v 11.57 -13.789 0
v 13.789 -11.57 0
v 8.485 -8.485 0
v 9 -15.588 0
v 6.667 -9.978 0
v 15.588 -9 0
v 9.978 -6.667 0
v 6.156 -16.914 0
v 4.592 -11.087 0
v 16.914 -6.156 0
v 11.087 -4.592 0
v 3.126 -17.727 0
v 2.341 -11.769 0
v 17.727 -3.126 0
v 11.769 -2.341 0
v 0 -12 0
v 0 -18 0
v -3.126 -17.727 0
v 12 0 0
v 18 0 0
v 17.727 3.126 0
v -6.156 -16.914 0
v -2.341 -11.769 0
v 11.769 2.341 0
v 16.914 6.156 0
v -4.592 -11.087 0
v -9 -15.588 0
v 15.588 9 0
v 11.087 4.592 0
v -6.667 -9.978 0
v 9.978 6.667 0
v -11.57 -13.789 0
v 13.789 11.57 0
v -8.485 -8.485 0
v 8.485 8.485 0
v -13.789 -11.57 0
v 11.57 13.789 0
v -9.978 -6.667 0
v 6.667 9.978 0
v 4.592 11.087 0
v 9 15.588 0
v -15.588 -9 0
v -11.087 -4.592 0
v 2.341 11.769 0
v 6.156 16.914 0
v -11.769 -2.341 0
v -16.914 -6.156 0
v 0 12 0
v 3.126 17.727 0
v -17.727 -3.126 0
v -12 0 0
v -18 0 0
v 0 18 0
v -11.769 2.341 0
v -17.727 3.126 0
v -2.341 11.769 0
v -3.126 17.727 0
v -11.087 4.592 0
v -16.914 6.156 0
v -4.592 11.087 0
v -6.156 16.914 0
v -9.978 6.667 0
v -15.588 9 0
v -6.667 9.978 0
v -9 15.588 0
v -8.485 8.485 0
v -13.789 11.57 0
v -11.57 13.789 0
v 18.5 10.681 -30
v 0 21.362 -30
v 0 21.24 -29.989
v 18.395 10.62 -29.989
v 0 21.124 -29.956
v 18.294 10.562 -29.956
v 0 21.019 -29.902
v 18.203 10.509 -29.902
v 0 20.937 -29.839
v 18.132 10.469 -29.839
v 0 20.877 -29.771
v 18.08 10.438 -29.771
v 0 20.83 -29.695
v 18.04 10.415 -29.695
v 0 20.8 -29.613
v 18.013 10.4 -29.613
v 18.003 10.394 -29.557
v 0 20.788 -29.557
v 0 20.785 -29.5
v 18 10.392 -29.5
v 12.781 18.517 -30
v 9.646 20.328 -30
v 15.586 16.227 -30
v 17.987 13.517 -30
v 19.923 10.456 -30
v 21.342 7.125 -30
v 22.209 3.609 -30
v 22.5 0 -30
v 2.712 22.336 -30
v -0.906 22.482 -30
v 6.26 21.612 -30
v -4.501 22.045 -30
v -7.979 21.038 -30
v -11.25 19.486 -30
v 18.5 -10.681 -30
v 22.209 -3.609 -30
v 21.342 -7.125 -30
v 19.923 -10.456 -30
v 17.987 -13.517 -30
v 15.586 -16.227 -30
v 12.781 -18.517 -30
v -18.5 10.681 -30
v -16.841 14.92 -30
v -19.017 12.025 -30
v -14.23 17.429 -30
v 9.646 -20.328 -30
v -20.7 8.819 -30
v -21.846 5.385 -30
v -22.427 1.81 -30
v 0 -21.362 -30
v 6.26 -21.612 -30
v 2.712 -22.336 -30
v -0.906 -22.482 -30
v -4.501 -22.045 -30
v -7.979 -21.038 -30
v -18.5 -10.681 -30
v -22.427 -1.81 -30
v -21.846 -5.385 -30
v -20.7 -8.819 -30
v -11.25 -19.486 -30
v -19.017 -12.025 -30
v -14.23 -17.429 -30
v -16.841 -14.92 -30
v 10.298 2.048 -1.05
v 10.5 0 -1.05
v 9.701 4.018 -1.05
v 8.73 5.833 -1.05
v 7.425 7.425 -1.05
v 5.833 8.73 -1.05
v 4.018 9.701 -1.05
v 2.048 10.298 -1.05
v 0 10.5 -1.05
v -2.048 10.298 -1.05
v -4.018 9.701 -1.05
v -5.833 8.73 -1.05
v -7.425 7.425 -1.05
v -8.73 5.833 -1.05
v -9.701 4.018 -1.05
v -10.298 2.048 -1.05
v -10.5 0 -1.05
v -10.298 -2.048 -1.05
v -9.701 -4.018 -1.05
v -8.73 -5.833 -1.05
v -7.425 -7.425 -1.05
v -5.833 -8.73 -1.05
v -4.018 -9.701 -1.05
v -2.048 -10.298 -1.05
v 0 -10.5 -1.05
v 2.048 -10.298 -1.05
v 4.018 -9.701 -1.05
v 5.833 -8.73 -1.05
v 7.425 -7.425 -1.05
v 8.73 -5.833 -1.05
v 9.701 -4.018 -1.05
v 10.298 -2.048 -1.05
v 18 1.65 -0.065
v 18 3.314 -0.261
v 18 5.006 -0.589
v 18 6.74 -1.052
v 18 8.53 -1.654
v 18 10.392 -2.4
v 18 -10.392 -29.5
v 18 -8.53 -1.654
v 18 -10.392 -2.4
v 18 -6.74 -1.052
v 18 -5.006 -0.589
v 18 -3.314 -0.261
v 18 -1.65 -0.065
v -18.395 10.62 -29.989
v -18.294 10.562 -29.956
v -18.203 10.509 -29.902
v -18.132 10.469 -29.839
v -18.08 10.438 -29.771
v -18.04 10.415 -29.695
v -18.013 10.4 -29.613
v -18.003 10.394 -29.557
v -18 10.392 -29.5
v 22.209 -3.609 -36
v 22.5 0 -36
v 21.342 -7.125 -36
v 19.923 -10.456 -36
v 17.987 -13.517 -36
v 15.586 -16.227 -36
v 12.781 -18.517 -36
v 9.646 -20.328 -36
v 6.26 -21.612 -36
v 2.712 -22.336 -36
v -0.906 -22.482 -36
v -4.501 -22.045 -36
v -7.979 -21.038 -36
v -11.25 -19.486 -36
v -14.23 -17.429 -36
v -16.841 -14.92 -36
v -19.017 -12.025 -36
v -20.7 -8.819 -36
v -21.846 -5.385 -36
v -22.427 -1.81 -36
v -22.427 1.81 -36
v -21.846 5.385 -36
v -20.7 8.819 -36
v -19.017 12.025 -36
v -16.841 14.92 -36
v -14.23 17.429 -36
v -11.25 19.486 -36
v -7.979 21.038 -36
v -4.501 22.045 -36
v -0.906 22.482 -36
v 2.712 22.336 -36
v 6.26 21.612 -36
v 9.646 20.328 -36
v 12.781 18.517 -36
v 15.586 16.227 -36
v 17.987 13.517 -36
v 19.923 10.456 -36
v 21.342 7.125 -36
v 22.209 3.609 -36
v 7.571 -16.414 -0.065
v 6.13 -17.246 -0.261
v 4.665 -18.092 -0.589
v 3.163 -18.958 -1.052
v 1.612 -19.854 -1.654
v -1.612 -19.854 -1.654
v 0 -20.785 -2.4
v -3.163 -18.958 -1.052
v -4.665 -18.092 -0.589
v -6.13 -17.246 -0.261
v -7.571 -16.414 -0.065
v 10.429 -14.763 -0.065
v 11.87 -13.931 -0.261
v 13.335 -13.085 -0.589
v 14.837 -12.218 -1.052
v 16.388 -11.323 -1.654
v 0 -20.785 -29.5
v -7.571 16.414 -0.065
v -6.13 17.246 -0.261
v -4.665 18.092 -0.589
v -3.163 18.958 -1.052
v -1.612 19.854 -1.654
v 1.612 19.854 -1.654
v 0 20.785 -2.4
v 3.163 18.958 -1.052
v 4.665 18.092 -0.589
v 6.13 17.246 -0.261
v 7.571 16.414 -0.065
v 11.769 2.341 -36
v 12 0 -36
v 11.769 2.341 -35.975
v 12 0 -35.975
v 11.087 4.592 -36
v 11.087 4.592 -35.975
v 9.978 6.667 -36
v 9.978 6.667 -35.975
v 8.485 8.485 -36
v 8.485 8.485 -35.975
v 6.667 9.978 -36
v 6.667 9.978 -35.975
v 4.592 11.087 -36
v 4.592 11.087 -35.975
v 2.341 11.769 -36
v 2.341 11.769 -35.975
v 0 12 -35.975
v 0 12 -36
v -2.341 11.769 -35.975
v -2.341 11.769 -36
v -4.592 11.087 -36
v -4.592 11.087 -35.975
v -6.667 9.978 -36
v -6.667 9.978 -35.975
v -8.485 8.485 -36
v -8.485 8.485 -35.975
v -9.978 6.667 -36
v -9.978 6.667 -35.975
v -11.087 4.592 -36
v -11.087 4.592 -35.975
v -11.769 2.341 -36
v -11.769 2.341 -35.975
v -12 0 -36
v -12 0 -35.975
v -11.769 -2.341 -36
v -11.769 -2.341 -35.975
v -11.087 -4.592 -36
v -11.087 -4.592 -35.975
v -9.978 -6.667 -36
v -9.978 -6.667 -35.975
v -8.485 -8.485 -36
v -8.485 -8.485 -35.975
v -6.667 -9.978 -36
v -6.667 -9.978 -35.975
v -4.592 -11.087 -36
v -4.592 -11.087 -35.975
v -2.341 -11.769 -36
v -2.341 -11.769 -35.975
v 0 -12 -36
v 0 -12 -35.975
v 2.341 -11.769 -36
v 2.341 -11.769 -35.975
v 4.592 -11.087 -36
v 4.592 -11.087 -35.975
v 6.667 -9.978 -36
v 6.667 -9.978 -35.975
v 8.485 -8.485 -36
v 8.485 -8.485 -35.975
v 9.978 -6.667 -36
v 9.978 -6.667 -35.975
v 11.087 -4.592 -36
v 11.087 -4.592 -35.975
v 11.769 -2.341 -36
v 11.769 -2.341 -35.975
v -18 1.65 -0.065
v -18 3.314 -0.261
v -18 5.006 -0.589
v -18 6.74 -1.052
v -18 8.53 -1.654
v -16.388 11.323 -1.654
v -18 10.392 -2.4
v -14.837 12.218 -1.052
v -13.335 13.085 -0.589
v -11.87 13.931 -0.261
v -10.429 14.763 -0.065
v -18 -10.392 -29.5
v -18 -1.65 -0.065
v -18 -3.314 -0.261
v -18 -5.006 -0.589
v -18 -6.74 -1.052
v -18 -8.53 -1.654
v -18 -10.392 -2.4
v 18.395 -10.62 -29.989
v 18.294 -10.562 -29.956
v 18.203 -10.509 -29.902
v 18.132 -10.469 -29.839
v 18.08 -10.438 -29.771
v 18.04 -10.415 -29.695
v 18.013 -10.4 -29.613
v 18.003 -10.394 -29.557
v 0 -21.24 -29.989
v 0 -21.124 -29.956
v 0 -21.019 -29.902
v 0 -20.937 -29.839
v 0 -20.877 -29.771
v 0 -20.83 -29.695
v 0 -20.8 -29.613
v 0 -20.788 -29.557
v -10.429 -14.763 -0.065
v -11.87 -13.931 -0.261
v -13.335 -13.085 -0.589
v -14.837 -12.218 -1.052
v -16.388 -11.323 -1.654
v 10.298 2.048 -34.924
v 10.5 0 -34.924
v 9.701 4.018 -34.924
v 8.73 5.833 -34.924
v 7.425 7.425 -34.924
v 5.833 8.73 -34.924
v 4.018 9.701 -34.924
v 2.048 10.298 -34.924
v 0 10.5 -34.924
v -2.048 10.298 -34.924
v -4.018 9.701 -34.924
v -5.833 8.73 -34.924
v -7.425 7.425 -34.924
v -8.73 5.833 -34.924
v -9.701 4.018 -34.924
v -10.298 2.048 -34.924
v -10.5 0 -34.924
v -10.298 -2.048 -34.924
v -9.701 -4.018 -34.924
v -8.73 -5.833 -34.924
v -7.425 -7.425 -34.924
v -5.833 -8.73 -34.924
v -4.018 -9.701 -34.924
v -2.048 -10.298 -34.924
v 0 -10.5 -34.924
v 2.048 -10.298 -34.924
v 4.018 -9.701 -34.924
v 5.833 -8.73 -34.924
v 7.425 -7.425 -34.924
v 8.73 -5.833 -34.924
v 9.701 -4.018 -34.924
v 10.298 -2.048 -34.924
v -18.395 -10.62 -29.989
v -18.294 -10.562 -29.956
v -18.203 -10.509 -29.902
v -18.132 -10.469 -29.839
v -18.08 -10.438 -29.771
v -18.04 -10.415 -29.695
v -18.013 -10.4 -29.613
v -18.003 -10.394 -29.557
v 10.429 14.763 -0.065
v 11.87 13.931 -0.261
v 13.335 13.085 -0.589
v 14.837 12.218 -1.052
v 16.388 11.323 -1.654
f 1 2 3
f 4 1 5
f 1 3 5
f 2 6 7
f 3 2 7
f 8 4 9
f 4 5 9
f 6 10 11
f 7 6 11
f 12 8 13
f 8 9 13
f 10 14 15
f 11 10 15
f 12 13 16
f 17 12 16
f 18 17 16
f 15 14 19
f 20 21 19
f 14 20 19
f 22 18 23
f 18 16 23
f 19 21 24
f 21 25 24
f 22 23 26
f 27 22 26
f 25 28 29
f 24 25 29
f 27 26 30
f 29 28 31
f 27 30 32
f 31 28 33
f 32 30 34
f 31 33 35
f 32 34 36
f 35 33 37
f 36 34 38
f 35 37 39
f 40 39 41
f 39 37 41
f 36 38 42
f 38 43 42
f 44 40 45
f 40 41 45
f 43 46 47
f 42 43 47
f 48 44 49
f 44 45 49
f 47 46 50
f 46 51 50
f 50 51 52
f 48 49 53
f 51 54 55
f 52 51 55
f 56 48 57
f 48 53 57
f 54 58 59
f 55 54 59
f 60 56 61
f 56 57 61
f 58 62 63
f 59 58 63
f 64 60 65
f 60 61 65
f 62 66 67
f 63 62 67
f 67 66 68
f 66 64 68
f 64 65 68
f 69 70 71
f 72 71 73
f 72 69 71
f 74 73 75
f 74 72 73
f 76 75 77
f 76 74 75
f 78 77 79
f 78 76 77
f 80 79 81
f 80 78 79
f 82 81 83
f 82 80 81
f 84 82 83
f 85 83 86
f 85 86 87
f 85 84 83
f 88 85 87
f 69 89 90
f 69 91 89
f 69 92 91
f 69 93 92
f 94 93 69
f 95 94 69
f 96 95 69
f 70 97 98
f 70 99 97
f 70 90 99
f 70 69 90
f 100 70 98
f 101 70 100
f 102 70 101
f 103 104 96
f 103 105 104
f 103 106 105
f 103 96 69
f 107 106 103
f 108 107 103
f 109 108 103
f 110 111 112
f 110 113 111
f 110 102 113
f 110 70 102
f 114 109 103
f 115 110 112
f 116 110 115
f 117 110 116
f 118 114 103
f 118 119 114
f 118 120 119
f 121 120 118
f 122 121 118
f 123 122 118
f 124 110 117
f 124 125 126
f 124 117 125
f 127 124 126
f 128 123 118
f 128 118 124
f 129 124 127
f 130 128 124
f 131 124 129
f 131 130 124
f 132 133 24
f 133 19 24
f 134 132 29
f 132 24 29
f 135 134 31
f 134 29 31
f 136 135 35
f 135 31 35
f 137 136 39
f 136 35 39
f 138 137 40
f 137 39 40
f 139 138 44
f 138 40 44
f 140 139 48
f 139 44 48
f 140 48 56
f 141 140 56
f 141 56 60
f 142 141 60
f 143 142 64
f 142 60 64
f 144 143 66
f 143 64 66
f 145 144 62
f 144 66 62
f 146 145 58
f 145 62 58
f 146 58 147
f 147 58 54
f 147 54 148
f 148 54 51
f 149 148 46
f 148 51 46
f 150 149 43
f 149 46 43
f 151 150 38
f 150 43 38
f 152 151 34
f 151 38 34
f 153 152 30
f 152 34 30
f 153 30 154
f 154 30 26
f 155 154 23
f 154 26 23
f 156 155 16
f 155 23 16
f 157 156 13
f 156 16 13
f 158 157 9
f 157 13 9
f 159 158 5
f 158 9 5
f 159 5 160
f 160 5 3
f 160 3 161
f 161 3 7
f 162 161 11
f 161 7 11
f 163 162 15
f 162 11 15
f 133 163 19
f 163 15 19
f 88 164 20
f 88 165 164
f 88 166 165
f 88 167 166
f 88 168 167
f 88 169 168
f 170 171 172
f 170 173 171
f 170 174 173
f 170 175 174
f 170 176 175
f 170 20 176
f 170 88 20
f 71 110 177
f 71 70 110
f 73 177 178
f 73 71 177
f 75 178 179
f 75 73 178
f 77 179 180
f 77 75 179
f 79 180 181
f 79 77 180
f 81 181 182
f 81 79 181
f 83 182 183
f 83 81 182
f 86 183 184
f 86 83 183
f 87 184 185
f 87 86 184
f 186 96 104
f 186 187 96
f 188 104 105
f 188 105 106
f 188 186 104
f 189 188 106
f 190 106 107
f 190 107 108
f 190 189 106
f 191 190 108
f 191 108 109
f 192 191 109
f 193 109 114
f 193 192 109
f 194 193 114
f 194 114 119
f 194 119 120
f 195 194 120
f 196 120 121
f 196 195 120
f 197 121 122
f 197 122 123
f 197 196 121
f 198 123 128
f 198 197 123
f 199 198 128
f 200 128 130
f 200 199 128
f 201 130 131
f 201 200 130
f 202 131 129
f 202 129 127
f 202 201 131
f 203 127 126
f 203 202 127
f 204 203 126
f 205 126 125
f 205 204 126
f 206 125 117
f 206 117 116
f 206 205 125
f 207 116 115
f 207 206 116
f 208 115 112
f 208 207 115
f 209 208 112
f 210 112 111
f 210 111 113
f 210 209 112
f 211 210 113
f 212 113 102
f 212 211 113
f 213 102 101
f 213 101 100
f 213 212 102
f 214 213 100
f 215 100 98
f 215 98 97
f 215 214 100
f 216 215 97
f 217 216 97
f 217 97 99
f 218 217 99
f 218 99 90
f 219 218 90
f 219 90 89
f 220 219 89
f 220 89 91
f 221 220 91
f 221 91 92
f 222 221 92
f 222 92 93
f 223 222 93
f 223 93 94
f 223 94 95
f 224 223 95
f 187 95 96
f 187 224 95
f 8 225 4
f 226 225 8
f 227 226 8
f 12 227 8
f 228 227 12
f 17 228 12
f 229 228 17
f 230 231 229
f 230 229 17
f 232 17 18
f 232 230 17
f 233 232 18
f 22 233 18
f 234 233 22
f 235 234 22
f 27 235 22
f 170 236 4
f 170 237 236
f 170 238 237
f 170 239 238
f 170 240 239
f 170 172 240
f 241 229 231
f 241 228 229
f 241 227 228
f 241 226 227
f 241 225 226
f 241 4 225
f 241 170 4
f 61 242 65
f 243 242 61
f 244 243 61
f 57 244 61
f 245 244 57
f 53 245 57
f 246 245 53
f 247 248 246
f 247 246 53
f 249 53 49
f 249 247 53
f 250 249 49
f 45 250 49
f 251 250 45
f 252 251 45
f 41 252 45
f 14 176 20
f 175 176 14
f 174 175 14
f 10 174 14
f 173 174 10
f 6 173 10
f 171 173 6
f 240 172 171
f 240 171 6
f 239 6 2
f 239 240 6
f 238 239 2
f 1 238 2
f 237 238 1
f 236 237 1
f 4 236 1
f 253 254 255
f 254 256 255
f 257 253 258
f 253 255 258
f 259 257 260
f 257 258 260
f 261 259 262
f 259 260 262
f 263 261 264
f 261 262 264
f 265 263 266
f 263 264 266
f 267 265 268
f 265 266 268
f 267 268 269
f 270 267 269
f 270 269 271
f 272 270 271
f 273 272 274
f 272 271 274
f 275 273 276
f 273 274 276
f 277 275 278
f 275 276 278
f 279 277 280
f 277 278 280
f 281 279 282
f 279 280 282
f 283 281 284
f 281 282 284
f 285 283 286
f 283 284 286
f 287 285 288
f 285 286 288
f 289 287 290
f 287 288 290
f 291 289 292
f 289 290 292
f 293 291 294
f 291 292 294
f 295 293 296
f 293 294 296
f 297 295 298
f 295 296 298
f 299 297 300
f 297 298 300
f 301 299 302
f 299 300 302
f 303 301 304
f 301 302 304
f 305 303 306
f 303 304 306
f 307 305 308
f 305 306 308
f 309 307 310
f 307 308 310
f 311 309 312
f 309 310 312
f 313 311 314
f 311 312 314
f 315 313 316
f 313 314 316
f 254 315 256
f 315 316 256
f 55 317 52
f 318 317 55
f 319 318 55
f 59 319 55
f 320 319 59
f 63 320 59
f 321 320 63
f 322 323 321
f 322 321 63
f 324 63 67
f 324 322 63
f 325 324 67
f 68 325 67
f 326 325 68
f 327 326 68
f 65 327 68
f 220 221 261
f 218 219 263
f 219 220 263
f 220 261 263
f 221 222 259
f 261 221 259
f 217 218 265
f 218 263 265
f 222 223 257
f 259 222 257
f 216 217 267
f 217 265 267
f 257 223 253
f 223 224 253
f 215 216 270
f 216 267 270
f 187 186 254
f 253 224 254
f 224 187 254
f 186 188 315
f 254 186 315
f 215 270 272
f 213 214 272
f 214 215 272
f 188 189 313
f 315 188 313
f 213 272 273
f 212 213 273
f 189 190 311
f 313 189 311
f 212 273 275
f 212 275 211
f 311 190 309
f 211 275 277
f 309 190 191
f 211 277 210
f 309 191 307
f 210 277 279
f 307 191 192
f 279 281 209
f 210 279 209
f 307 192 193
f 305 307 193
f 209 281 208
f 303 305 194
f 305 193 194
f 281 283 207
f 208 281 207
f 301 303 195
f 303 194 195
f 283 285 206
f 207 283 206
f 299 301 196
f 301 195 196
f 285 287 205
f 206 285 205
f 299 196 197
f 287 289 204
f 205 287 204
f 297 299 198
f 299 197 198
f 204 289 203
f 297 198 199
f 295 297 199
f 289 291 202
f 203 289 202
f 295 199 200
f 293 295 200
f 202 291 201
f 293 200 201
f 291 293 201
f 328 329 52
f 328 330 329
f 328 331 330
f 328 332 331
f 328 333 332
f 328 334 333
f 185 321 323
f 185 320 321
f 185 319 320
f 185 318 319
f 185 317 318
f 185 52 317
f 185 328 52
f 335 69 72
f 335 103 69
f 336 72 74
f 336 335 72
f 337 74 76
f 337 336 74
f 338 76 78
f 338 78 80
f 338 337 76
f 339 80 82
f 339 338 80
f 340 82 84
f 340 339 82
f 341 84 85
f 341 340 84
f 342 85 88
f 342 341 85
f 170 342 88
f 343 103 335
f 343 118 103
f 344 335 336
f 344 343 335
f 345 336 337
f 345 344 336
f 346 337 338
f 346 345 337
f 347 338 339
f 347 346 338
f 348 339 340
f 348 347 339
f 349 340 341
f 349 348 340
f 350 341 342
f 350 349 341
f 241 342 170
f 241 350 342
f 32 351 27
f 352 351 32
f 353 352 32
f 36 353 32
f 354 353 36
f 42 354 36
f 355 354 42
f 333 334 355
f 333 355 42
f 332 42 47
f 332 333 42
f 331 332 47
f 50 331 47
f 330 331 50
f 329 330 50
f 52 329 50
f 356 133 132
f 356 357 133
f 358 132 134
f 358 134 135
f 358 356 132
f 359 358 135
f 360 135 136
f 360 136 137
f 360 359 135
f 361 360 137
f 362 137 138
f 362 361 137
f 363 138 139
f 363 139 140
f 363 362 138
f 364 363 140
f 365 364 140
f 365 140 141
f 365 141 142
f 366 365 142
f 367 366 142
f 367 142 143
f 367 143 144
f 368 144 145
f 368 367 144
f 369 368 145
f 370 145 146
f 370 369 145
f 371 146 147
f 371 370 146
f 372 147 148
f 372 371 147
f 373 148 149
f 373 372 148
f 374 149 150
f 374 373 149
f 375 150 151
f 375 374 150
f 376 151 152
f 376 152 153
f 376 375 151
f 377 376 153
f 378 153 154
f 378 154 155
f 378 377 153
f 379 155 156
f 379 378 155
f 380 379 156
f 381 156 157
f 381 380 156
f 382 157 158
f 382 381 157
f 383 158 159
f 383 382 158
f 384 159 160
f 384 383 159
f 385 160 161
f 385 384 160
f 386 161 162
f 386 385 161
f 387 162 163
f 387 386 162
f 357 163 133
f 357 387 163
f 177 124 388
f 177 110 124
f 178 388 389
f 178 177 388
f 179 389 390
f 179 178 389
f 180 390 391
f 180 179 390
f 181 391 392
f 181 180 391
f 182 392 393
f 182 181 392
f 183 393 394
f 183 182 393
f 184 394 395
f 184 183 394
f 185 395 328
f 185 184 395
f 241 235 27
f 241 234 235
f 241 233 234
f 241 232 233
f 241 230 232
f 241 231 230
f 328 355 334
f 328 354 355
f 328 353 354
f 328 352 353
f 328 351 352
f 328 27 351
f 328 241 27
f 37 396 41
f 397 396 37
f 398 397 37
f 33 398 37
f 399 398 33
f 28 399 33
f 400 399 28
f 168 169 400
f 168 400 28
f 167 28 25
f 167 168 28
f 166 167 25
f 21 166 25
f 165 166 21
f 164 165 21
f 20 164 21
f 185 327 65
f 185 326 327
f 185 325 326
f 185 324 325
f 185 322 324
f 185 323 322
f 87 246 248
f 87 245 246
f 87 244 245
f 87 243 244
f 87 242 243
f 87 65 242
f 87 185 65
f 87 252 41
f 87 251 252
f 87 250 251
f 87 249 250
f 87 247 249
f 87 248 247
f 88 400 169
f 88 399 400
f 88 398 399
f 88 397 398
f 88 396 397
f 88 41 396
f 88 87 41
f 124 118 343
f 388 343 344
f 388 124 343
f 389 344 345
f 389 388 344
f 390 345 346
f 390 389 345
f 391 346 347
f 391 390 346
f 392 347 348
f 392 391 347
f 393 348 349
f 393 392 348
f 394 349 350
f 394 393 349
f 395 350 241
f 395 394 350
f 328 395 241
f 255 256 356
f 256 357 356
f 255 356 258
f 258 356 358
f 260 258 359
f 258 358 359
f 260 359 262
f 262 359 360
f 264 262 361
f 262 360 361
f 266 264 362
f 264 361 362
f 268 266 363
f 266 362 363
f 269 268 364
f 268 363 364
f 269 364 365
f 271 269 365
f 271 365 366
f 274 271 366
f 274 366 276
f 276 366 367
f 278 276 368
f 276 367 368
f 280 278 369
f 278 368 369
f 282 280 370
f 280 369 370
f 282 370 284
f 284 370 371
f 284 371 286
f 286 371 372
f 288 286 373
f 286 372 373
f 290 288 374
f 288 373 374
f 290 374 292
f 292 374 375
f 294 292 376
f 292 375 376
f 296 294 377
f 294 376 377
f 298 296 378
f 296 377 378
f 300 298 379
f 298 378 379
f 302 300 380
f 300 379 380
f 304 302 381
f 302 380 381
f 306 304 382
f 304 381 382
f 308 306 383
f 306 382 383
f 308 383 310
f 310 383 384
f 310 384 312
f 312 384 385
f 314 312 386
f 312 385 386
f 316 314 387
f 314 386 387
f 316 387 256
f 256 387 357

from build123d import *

# Parameters (mm, degrees)
BASENUT_START = -36
BASENUTSKE_R  = 10.5
BASENUT_DEPTH = 36
COLLARSKE_W   = 6
COLLARSKE_H   = 12
FILLET_2_R    = 0.5


# Read off the part's stored shape, not the designer's step: ThreadSchematic
with BuildPart() as part:
    # BaseNutSke → BaseNut (new body)
    with BuildSketch(Plane.XY.offset(BASENUT_START)):
        Polygon((18, 10.392304845), (18, -10.392304845), (0, -20.784609691), (-18, -10.392304845), (-18, 10.392304845), (0, 20.784609691), align=None)
        Circle(BASENUTSKE_R, mode=Mode.SUBTRACT)
    extrude(amount=BASENUT_DEPTH)

    # Sketch5 (on Right Plane) → EndChamfer (revolve, cut)
    with BuildSketch(Plane(origin=(0, 0, 0), x_dir=(0, 0, -1), z_dir=(1, 0, 0))):
        Polygon((35.9746, 12), (34.819257562, 10.35), (36.0254, 10.35), (36.0254, 12), align=None)
    revolve(axis=Axis((0, 10.35, -36.0254), (0, 0, 1)), mode=Mode.SUBTRACT)

    # CollarSke → Collar (revolve)
    with BuildSketch(Plane(origin=(0, 0, 0), x_dir=(0, 0, -1), z_dir=(1, 0, 0)), mode=Mode.PRIVATE) as collar_sk:
        with Locations((33, 16.5)):
            Rectangle(COLLARSKE_W, COLLARSKE_H)
    revolve(collar_sk.sketch.rotate(Axis((0, 0, 0), (0, 0, -1)), 90), axis=Axis((0, 0, 0), (0, 0, -1)))

    # Sketch3 → Chamfer 2 (revolve, cut)
    with BuildSketch(Plane(origin=(0, 0, 0), x_dir=(0, 0, -1), z_dir=(1, 0, 0))):
        Polygon((2.4, 33.484609691), (-12.7, 33.484609691), (-12.7, 18), (0, 18), (2.4, 20.784609691), align=None)
    revolve(axis=Axis((0, 0, 0), (0, 0, -1)), mode=Mode.SUBTRACT)

    # ThreadSchematic outline → ThreadSchematic (revolve, cut)
    with BuildSketch(Plane.XZ):
        Polygon((10.5, 0), (10.5, -1.050311307), (12, 0), align=None)
        Polygon((12, -35.9746), (10.5, -34.924288693), (10.5, -36), (12, -36), align=None)
    revolve(axis=Axis((0, 0, 0), (0, 0, 1)), mode=Mode.SUBTRACT)

    # Fillet 2
    fillet_2_edges = [part.edges().sort_by_distance(p)[0] for p in [
        (9, 15.588457268, -30),
        (-9, 15.588457268, -30),
        (-18, 0, -30),
        (-9, -15.588457268, -30),
        (9, -15.588457268, -30),
        (18, 0, -30),
    ]]
    fillet(fillet_2_edges, radius=FILLET_2_R)


solid = part.part
